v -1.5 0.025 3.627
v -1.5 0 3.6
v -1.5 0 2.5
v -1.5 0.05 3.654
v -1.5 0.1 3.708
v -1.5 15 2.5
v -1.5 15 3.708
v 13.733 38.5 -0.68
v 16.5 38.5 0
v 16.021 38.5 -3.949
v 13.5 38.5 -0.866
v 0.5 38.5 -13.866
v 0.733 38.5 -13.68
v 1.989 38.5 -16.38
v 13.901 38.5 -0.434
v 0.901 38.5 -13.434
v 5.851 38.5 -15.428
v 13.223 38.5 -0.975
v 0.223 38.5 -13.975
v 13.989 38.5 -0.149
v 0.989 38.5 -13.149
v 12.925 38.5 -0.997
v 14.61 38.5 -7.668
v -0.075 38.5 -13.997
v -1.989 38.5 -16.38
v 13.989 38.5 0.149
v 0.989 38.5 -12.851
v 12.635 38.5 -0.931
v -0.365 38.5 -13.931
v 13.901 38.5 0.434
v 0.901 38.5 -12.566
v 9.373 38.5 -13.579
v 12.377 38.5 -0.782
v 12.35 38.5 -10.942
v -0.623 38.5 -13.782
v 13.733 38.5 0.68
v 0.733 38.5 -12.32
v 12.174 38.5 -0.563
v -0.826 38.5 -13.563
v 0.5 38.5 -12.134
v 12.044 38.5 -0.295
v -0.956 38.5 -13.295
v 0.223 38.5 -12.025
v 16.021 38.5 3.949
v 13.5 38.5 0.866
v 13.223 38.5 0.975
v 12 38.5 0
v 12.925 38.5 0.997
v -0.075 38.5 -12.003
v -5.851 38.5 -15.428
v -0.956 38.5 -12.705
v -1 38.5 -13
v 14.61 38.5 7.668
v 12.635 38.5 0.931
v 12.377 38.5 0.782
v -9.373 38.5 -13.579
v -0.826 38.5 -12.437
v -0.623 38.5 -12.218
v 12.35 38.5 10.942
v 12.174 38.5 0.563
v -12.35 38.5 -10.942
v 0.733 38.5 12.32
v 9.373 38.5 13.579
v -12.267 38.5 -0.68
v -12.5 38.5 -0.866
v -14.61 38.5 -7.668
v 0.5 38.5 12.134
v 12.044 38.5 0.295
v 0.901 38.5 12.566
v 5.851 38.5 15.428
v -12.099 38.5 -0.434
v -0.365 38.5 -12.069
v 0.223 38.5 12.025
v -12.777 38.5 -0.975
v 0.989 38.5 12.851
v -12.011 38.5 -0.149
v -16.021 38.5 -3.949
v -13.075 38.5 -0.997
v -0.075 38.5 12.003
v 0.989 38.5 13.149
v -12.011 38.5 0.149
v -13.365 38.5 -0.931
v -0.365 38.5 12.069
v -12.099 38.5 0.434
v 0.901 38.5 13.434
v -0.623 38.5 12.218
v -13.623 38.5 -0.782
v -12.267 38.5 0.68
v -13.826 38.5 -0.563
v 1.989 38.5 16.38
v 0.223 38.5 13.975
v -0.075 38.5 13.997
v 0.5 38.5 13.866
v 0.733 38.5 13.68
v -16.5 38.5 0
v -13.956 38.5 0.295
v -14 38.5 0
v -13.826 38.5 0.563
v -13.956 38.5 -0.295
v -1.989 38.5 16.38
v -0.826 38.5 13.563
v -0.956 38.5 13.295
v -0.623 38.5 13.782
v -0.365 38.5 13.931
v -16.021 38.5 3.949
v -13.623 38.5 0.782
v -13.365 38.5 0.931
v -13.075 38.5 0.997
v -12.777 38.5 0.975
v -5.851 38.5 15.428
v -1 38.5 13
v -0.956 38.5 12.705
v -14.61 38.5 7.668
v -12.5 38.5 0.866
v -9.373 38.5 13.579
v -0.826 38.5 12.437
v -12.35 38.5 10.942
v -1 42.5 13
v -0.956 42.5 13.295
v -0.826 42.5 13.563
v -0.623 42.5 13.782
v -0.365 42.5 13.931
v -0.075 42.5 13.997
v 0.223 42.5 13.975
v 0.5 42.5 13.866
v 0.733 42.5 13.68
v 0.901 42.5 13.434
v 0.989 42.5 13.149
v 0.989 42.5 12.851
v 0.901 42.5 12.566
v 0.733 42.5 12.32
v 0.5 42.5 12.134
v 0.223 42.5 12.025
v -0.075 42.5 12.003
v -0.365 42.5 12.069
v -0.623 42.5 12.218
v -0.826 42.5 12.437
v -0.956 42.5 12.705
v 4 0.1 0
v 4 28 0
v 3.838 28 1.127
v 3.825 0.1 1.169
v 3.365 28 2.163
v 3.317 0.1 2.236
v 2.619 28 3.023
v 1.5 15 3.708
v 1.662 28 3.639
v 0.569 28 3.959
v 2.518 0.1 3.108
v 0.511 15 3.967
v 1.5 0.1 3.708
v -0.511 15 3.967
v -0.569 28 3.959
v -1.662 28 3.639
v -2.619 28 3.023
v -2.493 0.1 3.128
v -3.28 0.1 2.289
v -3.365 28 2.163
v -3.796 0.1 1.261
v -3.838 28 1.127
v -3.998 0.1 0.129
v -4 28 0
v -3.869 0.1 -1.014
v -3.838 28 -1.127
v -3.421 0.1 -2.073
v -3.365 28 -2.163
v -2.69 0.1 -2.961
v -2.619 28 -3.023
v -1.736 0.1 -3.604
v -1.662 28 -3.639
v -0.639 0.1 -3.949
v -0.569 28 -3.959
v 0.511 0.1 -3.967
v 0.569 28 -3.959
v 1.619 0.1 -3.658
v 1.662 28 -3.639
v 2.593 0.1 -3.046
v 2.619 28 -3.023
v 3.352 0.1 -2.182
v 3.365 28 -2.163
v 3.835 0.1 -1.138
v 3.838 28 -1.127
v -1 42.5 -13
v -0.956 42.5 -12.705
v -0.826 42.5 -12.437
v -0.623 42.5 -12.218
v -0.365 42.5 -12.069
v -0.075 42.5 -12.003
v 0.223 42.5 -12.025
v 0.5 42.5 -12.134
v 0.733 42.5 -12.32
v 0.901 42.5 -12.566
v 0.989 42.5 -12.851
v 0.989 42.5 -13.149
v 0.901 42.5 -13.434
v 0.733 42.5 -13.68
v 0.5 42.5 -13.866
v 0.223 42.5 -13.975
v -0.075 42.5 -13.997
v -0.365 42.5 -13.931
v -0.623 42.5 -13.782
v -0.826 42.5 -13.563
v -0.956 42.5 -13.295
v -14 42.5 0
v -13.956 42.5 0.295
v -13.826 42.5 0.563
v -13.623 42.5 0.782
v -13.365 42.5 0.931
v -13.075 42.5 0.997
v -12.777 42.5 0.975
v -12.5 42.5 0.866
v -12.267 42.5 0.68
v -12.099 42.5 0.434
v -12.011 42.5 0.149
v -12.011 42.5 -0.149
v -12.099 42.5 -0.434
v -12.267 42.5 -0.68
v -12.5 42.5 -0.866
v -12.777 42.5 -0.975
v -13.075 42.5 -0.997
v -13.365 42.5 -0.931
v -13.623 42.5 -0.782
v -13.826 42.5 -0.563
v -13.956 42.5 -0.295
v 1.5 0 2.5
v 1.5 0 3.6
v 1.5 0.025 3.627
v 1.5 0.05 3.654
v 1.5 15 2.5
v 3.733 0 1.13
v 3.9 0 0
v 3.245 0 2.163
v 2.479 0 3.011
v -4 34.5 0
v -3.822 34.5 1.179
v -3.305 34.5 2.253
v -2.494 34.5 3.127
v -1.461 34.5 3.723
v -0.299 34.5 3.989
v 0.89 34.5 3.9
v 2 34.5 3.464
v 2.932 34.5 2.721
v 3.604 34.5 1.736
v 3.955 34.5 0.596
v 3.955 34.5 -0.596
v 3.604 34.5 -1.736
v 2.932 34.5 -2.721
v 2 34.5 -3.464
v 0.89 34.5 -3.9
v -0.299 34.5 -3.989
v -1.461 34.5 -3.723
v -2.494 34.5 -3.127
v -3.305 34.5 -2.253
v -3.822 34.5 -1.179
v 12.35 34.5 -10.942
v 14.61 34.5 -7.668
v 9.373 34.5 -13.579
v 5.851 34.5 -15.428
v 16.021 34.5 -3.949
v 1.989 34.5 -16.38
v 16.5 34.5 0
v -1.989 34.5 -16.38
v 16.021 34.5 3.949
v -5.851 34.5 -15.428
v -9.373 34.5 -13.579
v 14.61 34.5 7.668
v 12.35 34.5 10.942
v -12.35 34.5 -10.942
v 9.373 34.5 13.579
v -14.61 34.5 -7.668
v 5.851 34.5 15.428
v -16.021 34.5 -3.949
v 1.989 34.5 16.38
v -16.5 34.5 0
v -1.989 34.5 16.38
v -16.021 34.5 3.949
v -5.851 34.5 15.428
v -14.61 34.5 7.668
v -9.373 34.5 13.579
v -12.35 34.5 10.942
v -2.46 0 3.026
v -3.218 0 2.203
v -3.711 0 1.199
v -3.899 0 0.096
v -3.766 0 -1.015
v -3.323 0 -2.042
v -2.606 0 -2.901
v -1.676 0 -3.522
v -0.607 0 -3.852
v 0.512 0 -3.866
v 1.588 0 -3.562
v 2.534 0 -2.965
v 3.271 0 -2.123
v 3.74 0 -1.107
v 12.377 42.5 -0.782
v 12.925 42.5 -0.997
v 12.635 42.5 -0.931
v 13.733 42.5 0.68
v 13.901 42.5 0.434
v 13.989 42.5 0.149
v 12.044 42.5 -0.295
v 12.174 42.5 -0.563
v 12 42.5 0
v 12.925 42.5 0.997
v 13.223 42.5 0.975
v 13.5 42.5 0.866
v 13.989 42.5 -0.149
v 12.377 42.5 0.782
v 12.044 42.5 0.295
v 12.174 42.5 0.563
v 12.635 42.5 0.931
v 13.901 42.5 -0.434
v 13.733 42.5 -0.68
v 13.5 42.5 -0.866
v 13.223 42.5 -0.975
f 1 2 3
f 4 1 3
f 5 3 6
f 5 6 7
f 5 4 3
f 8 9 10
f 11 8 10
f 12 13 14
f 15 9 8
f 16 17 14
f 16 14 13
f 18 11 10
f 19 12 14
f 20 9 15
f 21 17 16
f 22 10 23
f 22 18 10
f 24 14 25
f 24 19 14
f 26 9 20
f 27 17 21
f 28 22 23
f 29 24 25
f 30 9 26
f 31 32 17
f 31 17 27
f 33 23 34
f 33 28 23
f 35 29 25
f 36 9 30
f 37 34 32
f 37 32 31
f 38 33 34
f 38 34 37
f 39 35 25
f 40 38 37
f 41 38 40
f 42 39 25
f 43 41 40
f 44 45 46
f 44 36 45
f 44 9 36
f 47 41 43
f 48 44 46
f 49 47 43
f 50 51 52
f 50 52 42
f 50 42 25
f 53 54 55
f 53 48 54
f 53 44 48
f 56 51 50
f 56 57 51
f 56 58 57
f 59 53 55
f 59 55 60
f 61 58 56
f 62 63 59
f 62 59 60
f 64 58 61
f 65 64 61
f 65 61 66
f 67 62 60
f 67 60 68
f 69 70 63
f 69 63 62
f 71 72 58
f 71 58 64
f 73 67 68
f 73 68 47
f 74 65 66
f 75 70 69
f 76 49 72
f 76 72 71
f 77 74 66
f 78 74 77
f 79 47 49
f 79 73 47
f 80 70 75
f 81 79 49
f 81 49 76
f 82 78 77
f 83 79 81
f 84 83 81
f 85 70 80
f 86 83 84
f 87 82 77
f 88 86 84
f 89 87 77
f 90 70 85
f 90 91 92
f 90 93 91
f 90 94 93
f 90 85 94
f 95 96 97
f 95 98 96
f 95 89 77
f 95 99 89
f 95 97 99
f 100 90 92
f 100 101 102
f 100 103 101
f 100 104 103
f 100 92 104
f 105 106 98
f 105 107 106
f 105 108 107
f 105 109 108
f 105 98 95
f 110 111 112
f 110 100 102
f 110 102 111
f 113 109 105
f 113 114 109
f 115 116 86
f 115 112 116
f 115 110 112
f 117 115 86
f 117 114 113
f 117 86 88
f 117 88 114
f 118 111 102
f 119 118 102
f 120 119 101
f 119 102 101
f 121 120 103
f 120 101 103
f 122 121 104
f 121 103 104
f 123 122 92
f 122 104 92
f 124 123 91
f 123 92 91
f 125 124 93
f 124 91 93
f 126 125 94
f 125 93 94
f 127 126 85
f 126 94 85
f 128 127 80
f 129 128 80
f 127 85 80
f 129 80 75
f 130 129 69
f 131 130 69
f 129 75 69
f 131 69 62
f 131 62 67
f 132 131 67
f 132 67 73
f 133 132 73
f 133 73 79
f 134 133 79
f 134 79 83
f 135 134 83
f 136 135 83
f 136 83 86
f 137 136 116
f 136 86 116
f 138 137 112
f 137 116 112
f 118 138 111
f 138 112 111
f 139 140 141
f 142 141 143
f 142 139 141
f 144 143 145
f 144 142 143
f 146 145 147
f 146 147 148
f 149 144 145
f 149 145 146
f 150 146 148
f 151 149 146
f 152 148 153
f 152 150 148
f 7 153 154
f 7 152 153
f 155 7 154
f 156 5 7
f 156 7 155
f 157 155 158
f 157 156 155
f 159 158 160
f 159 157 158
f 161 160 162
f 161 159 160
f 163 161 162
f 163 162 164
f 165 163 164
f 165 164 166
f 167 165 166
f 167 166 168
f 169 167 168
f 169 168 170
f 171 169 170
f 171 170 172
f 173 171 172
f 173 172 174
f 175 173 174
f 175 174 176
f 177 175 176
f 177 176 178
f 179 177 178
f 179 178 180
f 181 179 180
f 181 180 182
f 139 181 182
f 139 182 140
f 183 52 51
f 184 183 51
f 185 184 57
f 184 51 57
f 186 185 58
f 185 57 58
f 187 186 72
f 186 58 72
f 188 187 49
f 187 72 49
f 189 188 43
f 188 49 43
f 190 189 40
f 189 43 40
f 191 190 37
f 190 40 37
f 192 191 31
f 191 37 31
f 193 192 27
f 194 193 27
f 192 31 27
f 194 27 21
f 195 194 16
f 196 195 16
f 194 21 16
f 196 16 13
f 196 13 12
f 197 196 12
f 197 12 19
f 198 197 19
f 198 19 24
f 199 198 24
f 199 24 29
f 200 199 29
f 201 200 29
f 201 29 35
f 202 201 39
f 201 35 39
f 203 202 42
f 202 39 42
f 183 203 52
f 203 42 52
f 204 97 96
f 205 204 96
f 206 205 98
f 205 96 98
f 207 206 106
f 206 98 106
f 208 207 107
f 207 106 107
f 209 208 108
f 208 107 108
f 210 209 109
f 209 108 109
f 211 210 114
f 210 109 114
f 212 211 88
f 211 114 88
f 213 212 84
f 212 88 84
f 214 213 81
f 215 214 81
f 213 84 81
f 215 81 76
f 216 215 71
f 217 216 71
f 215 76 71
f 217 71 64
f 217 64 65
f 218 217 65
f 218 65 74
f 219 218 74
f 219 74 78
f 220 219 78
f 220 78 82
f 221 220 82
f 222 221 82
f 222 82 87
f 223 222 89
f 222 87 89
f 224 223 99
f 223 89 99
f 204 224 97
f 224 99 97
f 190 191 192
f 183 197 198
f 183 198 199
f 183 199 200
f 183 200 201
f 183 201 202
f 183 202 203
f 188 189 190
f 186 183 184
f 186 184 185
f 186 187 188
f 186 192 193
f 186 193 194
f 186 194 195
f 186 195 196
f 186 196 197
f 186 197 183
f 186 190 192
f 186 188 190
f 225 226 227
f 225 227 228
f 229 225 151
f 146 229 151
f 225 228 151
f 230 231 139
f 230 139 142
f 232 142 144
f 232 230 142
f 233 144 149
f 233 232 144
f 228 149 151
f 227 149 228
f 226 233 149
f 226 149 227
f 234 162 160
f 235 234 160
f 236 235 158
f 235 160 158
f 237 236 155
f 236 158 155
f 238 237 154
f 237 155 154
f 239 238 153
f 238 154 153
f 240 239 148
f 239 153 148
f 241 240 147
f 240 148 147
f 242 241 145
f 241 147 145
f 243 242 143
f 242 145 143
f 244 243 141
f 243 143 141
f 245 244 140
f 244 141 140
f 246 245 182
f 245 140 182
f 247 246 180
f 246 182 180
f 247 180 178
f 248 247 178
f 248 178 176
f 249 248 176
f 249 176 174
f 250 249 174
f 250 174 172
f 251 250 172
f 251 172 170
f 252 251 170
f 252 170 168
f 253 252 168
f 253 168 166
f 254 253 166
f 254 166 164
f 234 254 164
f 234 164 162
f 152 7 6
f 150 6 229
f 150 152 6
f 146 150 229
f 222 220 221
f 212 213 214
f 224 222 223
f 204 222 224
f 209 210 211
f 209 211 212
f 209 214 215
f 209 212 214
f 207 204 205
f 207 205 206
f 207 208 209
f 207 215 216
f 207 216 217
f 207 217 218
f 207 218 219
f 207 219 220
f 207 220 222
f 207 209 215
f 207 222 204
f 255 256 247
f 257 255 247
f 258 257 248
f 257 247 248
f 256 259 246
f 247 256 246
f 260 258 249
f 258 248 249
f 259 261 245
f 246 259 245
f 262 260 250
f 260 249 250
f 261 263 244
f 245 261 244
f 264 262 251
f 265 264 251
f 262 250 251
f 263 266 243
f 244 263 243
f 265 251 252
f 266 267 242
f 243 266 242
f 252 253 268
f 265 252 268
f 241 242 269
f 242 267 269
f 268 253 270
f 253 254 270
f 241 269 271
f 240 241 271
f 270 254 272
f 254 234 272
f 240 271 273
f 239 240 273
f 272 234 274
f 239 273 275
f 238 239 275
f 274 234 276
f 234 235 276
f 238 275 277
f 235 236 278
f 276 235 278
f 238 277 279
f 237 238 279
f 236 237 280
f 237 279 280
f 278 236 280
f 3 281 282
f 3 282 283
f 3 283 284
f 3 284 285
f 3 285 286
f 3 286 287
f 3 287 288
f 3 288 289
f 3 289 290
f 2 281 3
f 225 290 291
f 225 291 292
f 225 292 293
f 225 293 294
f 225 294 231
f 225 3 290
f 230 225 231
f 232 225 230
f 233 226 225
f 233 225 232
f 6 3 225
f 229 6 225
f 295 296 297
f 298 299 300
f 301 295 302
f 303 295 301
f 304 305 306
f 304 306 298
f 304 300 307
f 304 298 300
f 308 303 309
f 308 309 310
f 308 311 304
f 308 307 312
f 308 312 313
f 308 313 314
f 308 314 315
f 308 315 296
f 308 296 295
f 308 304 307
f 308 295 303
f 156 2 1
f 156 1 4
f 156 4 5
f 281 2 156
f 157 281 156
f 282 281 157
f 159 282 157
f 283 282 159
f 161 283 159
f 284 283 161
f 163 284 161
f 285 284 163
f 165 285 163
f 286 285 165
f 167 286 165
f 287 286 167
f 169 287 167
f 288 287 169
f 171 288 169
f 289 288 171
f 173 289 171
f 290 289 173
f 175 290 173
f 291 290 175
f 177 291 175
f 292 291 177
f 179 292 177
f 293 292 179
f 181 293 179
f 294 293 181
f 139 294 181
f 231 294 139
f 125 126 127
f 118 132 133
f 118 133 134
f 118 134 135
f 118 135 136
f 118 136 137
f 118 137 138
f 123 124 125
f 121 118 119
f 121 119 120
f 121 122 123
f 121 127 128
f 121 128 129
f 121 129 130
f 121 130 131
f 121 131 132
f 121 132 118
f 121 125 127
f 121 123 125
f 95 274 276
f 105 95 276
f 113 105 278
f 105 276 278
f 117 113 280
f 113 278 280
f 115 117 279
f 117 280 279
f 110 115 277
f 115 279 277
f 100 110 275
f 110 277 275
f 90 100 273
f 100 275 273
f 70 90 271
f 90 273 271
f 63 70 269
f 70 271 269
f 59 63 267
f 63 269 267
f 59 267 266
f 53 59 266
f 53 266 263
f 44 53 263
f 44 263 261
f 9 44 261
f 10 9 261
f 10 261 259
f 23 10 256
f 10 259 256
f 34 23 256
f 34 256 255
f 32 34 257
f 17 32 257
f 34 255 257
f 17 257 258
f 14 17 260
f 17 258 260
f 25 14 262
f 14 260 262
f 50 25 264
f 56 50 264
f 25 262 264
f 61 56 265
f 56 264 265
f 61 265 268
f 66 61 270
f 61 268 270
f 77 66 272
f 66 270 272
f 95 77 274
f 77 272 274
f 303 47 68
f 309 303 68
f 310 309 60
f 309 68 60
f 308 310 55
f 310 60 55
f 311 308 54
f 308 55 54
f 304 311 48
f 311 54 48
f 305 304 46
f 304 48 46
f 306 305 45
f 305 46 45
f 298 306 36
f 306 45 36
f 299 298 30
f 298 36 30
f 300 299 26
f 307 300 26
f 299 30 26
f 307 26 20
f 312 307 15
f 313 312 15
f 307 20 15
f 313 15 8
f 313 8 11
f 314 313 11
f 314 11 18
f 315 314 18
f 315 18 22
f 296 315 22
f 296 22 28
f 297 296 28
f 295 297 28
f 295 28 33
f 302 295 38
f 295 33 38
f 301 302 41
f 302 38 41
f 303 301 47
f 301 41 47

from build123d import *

# Parameters (mm, degrees)
F0_R      = 4
F1_DEPTH  = 28
F2_SIZE   = 0.1
F3_R      = 4
F4_DEPTH  = 6.5
F5_R      = 16.5
F6_DEPTH  = 4
F7_R      = 1
F8_DEPTH  = 4
F9_W      = 3
F9_H      = 1.5
F10_DEPTH = 15


with BuildPart() as f1:
    # F0 (on Front) → F1 (new body)
    with BuildSketch(Plane.XZ):
        Circle(F0_R)
    extrude(amount=-F1_DEPTH)

    # F2
    f2_edges = [f1.edges().sort_by_distance(p)[0] for p in [
        (-4, 0, 0),
    ]]
    chamfer(f2_edges, length=F2_SIZE)

    # F3 (on face) → F4 (join)
    with BuildSketch(Plane(origin=(0, 28, 0), x_dir=(-1, 0, 0), z_dir=(0, 1, 0))):
        Circle(F3_R)
    extrude(amount=F4_DEPTH)

    # F5 (on face) → F6 (join)
    with BuildSketch(Plane(origin=(0, 34.5, 0), x_dir=(-1, 0, 0), z_dir=(0, 1, 0))):
        Circle(F5_R)
    extrude(amount=F6_DEPTH)

    # F7 (on face) → F8 (join)
    with BuildSketch(Plane(origin=(0, 38.5, 0), x_dir=(-1, 0, 0), z_dir=(0, 1, 0))):
        with Locations((0, 13)):
            Circle(F7_R)
        with Locations((-13, 0)):
            Circle(F7_R)
        with Locations((0, -13)):
            Circle(F7_R)
        with Locations((13, 0)):
            Circle(F7_R)
    extrude(amount=F8_DEPTH)

    # F9 (on face) → F10 (cut)
    with BuildSketch(Plane.XZ):
        with Locations((0, 3.25)):
            Rectangle(F9_W, F9_H)
    extrude(amount=-F10_DEPTH, mode=Mode.SUBTRACT)


solid = f1.part
